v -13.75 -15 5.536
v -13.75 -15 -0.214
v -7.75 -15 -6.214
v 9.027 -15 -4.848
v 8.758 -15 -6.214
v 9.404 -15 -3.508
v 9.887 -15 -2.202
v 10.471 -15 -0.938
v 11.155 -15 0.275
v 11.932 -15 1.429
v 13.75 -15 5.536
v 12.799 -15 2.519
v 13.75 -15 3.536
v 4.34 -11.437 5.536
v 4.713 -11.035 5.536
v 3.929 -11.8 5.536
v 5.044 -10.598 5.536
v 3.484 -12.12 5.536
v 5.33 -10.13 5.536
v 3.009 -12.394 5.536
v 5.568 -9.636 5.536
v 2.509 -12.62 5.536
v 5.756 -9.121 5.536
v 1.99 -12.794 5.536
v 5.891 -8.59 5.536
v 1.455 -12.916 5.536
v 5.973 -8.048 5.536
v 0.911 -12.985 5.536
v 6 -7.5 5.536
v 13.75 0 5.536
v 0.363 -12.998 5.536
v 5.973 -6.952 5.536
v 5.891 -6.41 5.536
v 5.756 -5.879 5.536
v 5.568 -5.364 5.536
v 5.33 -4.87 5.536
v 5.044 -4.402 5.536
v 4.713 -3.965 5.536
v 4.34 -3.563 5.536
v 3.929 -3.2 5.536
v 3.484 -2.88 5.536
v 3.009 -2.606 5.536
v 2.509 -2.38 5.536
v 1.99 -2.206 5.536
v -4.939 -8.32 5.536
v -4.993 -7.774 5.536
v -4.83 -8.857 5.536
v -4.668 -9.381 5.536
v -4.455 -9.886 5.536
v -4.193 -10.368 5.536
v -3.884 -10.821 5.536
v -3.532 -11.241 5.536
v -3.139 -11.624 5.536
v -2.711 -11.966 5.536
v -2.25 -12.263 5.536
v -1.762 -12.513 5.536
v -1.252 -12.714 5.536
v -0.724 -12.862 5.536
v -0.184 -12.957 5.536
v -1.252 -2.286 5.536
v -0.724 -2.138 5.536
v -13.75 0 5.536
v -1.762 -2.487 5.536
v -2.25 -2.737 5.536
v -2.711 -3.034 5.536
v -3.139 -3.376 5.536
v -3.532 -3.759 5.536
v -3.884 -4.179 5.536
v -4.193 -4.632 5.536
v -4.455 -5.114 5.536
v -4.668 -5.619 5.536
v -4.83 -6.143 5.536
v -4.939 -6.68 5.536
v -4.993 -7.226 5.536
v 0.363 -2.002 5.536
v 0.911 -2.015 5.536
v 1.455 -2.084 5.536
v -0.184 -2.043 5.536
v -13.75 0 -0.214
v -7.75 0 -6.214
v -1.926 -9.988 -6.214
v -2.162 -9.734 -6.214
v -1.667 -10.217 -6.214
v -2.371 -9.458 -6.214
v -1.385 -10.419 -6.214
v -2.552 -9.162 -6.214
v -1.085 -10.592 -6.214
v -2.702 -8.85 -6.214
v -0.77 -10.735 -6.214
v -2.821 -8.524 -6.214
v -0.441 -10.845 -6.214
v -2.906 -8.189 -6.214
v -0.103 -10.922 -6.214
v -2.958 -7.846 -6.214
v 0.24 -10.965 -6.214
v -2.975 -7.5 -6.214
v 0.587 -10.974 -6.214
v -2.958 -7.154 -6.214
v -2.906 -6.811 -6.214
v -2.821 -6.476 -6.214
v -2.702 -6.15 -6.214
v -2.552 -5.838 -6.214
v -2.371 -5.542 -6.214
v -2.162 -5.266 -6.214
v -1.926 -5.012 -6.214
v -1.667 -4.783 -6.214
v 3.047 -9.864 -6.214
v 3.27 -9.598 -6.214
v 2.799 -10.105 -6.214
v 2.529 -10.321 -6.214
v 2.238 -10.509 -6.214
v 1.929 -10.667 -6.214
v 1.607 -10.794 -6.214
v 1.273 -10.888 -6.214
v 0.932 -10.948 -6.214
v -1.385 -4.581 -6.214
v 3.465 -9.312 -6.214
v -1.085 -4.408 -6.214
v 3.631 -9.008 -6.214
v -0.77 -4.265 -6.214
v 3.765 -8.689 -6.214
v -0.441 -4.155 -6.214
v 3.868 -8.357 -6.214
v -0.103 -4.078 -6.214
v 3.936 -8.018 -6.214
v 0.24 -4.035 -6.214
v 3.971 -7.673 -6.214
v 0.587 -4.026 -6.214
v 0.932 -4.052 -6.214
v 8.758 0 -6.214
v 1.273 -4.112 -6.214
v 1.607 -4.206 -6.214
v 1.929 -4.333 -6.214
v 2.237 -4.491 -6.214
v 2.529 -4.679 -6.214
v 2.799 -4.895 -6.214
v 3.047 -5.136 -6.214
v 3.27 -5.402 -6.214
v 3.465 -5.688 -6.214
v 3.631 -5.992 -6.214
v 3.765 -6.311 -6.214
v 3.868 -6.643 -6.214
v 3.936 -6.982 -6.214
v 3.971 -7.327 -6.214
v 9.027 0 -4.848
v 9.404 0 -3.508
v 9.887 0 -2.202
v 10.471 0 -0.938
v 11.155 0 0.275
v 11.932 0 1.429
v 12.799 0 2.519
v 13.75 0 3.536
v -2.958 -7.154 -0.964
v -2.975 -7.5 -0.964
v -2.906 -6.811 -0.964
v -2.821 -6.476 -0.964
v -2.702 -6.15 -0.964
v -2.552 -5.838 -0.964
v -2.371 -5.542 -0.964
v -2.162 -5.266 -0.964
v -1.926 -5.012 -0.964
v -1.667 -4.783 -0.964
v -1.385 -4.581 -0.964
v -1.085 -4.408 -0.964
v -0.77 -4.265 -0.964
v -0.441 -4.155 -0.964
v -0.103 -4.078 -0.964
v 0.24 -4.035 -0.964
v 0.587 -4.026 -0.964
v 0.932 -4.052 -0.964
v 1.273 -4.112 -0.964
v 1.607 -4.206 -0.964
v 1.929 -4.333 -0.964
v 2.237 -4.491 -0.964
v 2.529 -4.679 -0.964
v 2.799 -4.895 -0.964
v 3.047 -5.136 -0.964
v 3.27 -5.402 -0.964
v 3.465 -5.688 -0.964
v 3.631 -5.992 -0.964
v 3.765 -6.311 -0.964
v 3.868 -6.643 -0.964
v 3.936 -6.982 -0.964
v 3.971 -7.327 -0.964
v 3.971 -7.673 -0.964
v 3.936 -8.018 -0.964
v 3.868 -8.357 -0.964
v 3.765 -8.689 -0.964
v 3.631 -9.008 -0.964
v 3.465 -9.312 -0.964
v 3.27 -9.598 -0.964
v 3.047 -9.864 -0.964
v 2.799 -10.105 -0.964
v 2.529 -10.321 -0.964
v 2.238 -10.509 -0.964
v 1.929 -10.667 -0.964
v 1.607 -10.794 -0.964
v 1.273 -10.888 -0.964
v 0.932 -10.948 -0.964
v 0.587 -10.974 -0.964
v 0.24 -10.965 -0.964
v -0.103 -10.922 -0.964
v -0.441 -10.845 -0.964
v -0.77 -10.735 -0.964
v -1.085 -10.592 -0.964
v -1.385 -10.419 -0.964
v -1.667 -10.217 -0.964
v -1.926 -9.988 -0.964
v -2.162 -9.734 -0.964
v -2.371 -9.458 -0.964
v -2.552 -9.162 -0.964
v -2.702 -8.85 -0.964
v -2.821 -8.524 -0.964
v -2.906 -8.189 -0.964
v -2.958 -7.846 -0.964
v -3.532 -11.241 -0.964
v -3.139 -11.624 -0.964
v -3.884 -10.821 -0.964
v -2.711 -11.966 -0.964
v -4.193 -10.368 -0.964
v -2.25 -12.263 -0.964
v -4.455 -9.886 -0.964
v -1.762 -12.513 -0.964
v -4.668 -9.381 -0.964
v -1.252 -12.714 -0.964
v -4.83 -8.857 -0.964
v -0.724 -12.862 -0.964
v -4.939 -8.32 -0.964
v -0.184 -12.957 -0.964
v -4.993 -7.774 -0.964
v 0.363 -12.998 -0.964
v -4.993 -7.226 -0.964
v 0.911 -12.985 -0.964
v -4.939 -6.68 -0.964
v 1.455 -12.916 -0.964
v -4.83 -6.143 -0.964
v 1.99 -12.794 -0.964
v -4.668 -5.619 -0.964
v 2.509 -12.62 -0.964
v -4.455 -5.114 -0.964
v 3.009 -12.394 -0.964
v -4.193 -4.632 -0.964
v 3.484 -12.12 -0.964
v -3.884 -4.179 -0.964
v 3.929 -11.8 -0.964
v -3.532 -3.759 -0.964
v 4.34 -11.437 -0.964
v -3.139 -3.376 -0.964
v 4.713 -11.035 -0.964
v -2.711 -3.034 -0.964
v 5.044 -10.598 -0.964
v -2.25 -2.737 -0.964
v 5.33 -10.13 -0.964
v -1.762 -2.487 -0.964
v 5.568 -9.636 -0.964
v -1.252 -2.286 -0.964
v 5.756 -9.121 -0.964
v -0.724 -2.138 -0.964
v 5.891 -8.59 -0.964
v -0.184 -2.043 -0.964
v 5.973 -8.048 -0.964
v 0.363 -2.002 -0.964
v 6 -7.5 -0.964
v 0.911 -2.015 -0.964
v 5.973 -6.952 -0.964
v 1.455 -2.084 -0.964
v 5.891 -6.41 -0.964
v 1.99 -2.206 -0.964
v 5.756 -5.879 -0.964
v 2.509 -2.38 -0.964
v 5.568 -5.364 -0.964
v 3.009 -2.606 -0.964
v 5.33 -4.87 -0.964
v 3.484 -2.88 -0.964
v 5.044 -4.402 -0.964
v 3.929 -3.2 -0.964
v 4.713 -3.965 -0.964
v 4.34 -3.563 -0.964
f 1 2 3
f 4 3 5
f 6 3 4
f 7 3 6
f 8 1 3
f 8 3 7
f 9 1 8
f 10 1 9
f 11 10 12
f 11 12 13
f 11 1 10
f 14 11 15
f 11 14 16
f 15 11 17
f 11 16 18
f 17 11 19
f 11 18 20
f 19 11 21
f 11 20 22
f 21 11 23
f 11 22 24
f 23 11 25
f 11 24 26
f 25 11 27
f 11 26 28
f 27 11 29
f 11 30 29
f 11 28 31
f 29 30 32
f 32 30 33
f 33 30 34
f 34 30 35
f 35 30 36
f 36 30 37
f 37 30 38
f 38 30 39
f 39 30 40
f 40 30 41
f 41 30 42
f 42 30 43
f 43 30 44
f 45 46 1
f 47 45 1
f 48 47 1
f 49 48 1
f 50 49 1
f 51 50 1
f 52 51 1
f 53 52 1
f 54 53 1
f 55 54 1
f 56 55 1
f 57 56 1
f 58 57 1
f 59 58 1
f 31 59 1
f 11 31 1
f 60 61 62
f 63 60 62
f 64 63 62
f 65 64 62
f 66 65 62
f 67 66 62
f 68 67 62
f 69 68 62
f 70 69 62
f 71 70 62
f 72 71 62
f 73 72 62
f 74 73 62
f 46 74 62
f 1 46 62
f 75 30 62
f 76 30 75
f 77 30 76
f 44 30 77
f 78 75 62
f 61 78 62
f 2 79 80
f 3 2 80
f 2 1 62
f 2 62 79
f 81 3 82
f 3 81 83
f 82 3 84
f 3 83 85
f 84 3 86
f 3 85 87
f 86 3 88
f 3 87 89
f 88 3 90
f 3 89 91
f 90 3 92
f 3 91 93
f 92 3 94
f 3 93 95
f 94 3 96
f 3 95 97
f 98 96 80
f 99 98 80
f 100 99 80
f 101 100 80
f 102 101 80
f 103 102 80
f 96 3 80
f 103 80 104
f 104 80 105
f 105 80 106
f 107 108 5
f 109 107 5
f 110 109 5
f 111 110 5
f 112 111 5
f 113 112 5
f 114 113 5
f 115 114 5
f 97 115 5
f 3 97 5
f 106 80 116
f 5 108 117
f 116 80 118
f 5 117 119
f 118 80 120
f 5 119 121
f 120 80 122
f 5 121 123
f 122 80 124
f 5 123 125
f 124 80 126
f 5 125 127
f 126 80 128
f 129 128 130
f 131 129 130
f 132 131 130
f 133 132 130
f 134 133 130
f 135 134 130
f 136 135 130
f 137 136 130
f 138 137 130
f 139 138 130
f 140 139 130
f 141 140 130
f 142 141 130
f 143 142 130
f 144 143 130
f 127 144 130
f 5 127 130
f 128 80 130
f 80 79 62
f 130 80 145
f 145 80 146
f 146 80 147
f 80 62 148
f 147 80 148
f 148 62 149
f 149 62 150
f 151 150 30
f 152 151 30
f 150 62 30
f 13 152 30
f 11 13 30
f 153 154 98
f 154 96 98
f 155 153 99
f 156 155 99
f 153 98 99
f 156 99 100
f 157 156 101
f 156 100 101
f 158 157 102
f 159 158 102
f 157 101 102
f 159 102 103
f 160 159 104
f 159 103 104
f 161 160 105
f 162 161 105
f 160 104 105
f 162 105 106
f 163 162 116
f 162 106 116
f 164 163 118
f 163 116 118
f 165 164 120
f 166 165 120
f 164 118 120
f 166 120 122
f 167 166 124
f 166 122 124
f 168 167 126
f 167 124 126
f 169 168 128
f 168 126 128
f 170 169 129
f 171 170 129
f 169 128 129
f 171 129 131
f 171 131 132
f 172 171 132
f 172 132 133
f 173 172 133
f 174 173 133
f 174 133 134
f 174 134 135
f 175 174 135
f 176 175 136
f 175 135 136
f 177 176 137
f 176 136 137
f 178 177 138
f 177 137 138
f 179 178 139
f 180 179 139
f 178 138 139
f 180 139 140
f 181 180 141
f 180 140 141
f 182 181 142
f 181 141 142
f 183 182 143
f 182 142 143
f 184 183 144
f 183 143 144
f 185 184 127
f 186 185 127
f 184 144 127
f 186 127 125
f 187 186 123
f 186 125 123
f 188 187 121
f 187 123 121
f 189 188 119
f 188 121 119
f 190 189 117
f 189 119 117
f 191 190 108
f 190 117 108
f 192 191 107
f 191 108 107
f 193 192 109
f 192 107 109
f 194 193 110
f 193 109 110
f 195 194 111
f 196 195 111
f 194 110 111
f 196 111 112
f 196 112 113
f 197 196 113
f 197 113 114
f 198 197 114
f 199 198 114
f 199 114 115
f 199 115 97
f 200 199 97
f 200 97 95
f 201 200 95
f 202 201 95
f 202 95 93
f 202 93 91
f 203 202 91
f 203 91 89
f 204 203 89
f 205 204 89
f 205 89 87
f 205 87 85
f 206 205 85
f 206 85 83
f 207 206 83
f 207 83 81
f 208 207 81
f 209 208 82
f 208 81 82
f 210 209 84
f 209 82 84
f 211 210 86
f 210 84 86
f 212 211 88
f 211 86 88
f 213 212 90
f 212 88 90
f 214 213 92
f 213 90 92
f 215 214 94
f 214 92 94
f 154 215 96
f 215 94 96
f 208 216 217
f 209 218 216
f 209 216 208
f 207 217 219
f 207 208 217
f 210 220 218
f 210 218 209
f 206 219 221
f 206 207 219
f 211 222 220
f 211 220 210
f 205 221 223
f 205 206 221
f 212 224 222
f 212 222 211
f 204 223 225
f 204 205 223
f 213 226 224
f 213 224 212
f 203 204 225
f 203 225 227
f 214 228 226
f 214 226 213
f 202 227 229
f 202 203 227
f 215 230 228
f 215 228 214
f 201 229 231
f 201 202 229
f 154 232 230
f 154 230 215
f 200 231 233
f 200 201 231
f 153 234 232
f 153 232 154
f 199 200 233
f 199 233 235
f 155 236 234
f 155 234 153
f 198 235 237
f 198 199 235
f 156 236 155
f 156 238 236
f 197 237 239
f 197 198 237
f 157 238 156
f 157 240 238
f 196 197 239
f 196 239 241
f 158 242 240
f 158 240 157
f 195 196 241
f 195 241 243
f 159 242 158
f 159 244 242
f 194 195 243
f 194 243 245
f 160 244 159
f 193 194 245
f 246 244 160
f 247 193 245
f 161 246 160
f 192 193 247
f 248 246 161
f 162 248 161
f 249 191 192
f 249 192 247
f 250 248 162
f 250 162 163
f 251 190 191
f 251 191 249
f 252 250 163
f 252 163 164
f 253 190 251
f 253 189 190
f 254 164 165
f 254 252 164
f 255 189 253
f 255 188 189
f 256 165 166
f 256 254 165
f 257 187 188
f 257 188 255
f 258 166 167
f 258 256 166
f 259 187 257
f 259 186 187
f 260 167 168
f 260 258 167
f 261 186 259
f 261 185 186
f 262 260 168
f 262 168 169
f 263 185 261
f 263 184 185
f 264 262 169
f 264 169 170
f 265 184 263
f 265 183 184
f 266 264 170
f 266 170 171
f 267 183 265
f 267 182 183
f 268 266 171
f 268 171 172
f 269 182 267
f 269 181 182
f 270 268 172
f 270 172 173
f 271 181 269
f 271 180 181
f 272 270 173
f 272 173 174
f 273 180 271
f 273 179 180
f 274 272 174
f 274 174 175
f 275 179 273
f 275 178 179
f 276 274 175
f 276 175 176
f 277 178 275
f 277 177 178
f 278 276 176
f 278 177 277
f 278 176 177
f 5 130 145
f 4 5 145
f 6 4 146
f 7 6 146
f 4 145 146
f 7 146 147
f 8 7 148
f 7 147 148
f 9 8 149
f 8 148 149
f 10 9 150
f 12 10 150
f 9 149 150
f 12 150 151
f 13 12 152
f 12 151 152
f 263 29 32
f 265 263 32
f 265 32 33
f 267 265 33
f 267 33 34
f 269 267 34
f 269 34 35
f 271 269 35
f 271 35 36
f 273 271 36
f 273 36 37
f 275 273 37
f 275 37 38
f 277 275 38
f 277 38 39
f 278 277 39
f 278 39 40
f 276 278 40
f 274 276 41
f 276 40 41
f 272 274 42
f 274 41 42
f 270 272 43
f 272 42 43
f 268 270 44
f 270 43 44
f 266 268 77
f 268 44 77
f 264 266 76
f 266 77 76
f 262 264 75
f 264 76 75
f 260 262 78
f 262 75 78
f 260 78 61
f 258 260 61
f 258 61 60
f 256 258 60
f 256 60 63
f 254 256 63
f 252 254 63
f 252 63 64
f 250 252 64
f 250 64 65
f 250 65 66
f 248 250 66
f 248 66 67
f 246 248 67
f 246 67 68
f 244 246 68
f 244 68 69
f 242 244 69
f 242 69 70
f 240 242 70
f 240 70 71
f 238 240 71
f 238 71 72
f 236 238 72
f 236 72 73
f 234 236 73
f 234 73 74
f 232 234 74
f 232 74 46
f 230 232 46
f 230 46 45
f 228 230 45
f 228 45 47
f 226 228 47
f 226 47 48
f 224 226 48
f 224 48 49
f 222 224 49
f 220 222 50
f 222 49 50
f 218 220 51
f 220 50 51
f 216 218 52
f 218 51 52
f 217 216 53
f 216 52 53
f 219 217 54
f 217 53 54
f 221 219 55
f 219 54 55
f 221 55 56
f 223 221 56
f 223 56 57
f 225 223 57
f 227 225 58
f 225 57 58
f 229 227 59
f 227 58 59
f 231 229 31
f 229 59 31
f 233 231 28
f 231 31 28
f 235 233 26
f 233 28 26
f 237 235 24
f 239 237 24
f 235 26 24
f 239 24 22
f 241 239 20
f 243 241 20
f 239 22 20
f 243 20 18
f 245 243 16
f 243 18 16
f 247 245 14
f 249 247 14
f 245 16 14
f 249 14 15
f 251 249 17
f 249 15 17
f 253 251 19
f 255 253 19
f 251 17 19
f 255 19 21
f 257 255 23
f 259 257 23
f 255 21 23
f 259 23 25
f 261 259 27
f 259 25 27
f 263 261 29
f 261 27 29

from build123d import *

# Parameters (mm, degrees)
F1_DEPTH       = 15
F3_D           = 6.95
F3_CBORE_D     = 11
F3_CBORE_DEPTH = 6.5


with BuildPart() as f1:
    # F0 (on Front) → F1 (new body)
    with BuildSketch(Plane.XZ):
        with BuildLine():
            Line((13.75, 5.535829), (-13.75, 5.535829))
            Line((-13.75, 5.535829), (-13.75, -0.214171))
            Line((-13.75, -0.214171), (-7.75, -6.214171))
            Line((-7.75, -6.214171), (8.757582, -6.214171))
            ThreePointArc((8.757582, -6.214171), (10.471279, -0.938491), (13.75, 3.535829))
            Line((13.75, 3.535829), (13.75, 5.535829))
        make_face()
    extrude(amount=F1_DEPTH)

    # F3 (through all)
    with Locations(Plane.XY.offset(5.535829)):
        with Locations((0.5, -7.5)):
            CounterBoreHole(F3_D / 2, F3_CBORE_D / 2, F3_CBORE_DEPTH)


solid = f1.part
